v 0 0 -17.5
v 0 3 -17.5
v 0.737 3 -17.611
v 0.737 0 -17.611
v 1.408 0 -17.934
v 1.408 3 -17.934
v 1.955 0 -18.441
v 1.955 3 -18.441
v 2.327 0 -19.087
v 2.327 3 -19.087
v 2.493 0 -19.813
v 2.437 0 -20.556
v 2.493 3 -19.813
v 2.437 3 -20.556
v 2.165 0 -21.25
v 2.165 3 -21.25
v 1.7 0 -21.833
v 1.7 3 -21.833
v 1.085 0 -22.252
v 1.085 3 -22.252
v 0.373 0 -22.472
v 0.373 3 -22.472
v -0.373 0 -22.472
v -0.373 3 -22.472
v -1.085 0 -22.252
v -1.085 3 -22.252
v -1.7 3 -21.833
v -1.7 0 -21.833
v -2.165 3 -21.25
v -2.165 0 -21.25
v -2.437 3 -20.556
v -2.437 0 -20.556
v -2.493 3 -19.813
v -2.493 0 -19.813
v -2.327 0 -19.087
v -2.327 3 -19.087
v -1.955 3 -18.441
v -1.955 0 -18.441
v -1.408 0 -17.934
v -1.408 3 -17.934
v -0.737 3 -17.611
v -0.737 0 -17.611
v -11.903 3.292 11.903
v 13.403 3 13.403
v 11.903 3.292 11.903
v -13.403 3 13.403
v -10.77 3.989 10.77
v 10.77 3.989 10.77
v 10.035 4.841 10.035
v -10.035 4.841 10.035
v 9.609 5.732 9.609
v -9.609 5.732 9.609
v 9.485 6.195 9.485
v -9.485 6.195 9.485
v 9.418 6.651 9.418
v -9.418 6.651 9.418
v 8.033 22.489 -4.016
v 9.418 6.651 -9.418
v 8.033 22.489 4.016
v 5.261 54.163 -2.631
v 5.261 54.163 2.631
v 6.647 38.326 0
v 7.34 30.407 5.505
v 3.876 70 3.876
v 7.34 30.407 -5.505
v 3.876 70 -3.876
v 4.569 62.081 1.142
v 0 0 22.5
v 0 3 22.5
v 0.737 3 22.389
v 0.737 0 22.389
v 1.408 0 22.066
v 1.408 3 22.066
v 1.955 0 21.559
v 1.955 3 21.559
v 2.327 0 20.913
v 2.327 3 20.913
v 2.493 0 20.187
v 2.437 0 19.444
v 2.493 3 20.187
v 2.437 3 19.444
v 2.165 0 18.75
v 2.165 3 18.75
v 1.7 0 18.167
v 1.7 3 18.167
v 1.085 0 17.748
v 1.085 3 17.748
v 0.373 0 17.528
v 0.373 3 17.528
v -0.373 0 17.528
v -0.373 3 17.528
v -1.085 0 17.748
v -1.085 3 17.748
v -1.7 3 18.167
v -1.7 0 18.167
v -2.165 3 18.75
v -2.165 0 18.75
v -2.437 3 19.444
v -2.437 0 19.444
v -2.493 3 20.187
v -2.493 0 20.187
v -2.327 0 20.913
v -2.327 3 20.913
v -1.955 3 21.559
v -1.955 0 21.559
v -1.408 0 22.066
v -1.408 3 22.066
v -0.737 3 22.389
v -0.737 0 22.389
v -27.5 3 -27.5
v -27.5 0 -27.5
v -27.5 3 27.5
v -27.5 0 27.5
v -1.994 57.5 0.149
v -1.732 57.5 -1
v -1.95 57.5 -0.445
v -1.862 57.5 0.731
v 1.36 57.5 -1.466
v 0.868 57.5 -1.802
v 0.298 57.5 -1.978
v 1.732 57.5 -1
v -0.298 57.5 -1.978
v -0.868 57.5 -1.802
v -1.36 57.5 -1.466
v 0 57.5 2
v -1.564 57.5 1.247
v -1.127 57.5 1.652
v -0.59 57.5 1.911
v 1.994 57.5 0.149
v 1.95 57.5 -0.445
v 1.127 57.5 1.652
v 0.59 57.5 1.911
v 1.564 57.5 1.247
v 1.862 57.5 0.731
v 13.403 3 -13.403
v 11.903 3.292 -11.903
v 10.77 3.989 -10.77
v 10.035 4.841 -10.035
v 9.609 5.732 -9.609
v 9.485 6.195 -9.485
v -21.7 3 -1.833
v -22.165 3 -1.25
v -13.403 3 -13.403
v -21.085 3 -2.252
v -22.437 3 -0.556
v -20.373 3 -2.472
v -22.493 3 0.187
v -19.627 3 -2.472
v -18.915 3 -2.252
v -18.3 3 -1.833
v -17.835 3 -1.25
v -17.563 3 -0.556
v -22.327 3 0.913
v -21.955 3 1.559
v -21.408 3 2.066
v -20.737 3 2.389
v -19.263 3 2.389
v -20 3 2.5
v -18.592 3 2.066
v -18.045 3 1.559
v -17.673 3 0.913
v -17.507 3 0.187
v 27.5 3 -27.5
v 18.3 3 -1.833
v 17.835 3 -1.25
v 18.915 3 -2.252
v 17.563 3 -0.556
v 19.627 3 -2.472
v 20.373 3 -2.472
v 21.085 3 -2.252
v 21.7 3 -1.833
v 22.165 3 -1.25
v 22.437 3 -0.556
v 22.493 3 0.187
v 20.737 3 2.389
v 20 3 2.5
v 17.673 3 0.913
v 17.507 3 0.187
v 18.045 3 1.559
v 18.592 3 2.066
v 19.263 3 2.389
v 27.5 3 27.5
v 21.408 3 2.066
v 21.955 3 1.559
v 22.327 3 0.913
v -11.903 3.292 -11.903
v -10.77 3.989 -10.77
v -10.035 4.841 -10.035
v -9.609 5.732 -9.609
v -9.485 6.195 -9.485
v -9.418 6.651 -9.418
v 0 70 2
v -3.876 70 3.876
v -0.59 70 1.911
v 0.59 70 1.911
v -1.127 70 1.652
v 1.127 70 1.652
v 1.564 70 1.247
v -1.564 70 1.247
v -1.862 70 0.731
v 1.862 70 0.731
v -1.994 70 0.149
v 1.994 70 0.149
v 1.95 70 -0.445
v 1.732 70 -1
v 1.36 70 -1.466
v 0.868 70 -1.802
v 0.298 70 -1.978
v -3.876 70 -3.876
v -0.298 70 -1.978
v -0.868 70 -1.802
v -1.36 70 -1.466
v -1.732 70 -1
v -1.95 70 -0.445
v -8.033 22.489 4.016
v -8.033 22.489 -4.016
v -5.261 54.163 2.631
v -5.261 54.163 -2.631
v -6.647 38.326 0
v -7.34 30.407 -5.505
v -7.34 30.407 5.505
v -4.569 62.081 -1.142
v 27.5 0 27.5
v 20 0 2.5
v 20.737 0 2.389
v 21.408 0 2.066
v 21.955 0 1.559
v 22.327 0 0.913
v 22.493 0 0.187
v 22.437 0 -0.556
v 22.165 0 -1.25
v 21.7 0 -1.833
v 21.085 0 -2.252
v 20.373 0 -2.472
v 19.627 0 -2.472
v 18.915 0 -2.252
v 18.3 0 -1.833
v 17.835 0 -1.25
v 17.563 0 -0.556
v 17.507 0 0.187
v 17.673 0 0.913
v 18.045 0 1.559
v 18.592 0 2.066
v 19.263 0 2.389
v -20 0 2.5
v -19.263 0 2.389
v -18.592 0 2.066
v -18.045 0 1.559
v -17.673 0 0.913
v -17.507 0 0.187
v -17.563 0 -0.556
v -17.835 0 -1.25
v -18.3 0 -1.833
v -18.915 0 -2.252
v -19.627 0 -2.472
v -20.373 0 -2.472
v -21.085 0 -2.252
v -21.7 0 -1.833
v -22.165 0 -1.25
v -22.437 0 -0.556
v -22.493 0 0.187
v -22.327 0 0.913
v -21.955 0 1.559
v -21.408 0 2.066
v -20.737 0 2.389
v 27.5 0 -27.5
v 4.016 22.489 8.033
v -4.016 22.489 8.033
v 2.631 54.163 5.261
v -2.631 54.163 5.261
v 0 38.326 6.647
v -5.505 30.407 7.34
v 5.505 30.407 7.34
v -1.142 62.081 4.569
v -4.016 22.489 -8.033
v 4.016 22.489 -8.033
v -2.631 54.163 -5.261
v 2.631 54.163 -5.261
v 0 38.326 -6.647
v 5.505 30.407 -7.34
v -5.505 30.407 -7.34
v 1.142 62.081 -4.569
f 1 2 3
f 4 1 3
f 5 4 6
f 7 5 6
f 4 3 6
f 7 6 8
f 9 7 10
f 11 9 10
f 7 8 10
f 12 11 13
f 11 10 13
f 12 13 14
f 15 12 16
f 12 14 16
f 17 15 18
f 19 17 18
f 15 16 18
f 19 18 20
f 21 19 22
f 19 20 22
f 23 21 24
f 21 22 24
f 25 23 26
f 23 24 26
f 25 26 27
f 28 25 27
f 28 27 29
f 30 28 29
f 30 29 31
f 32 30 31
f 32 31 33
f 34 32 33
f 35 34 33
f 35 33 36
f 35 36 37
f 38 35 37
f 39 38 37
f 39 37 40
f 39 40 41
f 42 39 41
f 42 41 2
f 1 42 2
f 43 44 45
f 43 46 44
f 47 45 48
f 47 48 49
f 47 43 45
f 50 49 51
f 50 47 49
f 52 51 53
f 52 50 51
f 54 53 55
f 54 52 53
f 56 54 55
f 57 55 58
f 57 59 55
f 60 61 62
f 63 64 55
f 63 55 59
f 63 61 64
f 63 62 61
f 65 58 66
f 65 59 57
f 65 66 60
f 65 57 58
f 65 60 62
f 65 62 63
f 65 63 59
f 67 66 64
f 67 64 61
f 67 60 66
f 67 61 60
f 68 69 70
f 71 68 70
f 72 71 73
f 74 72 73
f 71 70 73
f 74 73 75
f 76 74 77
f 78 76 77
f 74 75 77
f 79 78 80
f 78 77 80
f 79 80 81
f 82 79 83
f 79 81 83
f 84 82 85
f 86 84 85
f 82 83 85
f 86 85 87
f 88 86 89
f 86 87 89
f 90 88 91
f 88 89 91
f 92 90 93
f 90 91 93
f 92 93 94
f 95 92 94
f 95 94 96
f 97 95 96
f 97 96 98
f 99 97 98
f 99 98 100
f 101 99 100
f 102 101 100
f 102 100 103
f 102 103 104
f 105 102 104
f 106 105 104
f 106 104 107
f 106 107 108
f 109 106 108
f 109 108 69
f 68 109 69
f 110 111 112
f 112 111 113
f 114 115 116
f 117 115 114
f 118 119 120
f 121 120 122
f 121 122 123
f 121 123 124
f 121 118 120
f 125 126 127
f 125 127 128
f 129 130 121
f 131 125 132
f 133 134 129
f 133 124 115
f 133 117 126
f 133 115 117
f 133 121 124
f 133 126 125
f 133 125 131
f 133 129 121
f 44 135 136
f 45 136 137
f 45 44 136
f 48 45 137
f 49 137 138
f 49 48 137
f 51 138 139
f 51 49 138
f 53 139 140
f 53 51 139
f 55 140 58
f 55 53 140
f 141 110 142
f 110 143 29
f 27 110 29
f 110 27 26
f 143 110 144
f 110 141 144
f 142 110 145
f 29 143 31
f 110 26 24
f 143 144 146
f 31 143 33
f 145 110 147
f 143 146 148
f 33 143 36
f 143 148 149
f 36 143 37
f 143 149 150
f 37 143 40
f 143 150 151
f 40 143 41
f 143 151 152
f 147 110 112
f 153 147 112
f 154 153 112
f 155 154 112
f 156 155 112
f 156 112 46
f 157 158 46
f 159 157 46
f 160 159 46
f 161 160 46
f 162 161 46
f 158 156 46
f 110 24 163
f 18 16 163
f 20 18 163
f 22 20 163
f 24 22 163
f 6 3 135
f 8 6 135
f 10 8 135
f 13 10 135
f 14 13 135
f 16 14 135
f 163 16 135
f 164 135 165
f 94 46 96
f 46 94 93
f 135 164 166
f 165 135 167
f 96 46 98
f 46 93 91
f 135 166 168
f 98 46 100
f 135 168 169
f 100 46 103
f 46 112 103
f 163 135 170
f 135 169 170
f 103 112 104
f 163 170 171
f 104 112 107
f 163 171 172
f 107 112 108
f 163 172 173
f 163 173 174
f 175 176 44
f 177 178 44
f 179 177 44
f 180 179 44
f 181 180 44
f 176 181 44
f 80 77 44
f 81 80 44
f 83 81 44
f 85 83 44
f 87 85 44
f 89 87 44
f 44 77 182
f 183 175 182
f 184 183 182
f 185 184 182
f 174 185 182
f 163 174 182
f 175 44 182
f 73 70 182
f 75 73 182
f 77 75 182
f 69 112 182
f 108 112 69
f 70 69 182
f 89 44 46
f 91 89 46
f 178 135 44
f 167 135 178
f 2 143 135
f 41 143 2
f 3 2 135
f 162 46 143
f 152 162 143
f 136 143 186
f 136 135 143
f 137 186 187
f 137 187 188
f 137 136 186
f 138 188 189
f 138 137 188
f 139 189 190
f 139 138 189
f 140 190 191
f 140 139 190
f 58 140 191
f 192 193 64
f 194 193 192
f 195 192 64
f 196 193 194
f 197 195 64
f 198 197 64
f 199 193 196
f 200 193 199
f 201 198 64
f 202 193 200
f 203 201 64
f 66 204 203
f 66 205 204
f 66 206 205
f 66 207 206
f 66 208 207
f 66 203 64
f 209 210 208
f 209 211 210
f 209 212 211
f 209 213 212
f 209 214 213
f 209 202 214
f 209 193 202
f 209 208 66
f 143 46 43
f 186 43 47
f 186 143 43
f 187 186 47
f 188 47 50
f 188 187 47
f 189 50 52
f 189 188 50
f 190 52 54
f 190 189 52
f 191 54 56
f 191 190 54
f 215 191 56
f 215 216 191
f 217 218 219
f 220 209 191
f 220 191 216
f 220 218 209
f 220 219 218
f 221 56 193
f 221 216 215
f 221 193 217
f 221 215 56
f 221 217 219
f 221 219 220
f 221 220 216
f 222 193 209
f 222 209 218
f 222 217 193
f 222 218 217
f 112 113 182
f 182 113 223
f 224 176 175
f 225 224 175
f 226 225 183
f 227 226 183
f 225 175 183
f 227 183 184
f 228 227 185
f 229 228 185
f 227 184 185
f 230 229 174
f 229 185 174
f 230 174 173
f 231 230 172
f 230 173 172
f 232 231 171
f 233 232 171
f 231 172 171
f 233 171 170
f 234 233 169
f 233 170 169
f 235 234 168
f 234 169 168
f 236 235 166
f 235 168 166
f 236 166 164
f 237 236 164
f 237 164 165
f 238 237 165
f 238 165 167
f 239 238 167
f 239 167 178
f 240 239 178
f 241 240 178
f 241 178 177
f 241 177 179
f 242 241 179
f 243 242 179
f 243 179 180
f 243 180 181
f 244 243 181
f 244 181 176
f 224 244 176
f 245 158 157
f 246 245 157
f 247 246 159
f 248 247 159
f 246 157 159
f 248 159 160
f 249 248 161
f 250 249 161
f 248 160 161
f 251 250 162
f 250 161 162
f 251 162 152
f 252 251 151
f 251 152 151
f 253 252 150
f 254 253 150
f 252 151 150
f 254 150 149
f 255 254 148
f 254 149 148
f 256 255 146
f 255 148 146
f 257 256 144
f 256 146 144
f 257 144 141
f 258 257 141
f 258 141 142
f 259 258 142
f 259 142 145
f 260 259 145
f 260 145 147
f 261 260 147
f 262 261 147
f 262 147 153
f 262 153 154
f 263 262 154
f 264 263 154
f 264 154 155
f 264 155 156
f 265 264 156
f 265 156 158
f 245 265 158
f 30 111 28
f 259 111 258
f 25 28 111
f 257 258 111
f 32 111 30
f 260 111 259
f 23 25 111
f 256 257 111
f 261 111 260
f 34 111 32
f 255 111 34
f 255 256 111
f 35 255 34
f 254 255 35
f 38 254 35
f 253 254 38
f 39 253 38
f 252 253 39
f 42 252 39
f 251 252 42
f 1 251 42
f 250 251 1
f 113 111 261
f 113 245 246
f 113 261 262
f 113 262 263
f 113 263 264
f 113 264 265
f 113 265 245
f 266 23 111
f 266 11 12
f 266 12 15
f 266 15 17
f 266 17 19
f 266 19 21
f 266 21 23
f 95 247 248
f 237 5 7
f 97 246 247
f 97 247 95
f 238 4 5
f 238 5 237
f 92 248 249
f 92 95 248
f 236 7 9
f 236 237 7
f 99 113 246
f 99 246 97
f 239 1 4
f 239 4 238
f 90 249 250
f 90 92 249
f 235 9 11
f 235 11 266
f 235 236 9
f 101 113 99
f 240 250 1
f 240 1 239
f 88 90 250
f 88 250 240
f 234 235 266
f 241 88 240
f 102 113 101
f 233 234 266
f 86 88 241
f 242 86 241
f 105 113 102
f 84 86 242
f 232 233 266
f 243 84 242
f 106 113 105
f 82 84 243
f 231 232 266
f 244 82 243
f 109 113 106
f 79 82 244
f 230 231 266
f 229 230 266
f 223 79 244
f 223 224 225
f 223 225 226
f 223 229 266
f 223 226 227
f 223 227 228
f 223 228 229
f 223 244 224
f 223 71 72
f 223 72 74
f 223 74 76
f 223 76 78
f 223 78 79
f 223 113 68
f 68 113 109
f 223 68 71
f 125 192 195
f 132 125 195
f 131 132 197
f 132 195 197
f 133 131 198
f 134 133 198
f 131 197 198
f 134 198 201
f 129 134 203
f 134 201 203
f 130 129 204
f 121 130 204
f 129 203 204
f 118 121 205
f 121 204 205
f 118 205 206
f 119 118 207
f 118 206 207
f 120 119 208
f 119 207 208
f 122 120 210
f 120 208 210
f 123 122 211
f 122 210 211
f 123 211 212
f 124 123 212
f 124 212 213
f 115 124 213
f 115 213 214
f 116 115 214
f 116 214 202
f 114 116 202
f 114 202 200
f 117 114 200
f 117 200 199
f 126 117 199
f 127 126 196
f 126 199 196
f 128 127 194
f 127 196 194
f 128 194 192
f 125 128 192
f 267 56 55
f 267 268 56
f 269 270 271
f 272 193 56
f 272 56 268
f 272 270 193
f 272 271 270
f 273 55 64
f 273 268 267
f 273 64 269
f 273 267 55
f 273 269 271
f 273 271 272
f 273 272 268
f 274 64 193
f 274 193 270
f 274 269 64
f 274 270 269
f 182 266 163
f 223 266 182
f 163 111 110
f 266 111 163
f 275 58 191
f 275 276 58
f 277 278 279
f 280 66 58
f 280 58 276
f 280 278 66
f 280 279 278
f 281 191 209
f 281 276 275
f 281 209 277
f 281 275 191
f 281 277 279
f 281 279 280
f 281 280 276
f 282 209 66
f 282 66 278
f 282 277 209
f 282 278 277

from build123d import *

# Parameters (mm, degrees)
SKETCH1_W           = 20
SKETCH1_H           = 20
BOSS_EXTRUDE1_DEPTH = 70
BOSS_EXTRUDE1_TAPER = 5
SKETCH2_R           = 2
CUT_EXTRUDE1_DEPTH  = 12.5
SKETCH3_W           = 55
SKETCH3_H           = 55
BOSS_EXTRUDE2_DEPTH = 3
FILLET1_R           = 4
SKETCH5_R           = 2.5
CUT_EXTRUDE2_DEPTH  = 10


with BuildPart() as part:
    # Sketch1 → Boss-Extrude1 (new body)
    with BuildSketch(Plane(origin=(0, 0, 0), x_dir=(1, 0, 0), z_dir=(0, 1, 0))):
        Rectangle(SKETCH1_W, SKETCH1_H)
    extrude(amount=BOSS_EXTRUDE1_DEPTH, taper=BOSS_EXTRUDE1_TAPER)

    # Sketch2 → Cut-Extrude1 (cut)
    with BuildSketch(Plane(origin=(0, 70, 0), x_dir=(1, 0, 0), z_dir=(0, 1, 0))):
        with Locations(Location((0, 0, 0), (0, 0, 270))):
            Circle(SKETCH2_R)
    extrude(amount=-CUT_EXTRUDE1_DEPTH, mode=Mode.SUBTRACT)

    # Sketch3 → Boss-Extrude2 (add)
    with BuildSketch(Plane.XZ):
        Rectangle(SKETCH3_W, SKETCH3_H)
    extrude(amount=-BOSS_EXTRUDE2_DEPTH)

    # Fillet1
    fillet1_edges = [part.edges().sort_by_distance(p)[0] for p in [
        (0, 3, 9.737534009),
        (0, 3, -9.737534009),
        (9.737534009, 3, 0),
        (-9.737534009, 3, 0),
    ]]
    fillet(fillet1_edges, radius=FILLET1_R)

    # Sketch5 → Cut-Extrude2 (cut)
    with BuildSketch(Plane(origin=(0, 3, 0), x_dir=(1, 0, 0), z_dir=(0, 1, 0))):
        with Locations(Location((-20, 0, 0), (0, 0, 270))):
            Circle(SKETCH5_R)
        with Locations(Location((0, 20, 0), (0, 0, 270))):
            Circle(SKETCH5_R)
        with Locations(Location((20, 0, 0), (0, 0, 270))):
            Circle(SKETCH5_R)
        with Locations(Location((0, -20, 0), (0, 0, 270))):
            Circle(SKETCH5_R)
    extrude(amount=-CUT_EXTRUDE2_DEPTH, mode=Mode.SUBTRACT)


solid = part.part
